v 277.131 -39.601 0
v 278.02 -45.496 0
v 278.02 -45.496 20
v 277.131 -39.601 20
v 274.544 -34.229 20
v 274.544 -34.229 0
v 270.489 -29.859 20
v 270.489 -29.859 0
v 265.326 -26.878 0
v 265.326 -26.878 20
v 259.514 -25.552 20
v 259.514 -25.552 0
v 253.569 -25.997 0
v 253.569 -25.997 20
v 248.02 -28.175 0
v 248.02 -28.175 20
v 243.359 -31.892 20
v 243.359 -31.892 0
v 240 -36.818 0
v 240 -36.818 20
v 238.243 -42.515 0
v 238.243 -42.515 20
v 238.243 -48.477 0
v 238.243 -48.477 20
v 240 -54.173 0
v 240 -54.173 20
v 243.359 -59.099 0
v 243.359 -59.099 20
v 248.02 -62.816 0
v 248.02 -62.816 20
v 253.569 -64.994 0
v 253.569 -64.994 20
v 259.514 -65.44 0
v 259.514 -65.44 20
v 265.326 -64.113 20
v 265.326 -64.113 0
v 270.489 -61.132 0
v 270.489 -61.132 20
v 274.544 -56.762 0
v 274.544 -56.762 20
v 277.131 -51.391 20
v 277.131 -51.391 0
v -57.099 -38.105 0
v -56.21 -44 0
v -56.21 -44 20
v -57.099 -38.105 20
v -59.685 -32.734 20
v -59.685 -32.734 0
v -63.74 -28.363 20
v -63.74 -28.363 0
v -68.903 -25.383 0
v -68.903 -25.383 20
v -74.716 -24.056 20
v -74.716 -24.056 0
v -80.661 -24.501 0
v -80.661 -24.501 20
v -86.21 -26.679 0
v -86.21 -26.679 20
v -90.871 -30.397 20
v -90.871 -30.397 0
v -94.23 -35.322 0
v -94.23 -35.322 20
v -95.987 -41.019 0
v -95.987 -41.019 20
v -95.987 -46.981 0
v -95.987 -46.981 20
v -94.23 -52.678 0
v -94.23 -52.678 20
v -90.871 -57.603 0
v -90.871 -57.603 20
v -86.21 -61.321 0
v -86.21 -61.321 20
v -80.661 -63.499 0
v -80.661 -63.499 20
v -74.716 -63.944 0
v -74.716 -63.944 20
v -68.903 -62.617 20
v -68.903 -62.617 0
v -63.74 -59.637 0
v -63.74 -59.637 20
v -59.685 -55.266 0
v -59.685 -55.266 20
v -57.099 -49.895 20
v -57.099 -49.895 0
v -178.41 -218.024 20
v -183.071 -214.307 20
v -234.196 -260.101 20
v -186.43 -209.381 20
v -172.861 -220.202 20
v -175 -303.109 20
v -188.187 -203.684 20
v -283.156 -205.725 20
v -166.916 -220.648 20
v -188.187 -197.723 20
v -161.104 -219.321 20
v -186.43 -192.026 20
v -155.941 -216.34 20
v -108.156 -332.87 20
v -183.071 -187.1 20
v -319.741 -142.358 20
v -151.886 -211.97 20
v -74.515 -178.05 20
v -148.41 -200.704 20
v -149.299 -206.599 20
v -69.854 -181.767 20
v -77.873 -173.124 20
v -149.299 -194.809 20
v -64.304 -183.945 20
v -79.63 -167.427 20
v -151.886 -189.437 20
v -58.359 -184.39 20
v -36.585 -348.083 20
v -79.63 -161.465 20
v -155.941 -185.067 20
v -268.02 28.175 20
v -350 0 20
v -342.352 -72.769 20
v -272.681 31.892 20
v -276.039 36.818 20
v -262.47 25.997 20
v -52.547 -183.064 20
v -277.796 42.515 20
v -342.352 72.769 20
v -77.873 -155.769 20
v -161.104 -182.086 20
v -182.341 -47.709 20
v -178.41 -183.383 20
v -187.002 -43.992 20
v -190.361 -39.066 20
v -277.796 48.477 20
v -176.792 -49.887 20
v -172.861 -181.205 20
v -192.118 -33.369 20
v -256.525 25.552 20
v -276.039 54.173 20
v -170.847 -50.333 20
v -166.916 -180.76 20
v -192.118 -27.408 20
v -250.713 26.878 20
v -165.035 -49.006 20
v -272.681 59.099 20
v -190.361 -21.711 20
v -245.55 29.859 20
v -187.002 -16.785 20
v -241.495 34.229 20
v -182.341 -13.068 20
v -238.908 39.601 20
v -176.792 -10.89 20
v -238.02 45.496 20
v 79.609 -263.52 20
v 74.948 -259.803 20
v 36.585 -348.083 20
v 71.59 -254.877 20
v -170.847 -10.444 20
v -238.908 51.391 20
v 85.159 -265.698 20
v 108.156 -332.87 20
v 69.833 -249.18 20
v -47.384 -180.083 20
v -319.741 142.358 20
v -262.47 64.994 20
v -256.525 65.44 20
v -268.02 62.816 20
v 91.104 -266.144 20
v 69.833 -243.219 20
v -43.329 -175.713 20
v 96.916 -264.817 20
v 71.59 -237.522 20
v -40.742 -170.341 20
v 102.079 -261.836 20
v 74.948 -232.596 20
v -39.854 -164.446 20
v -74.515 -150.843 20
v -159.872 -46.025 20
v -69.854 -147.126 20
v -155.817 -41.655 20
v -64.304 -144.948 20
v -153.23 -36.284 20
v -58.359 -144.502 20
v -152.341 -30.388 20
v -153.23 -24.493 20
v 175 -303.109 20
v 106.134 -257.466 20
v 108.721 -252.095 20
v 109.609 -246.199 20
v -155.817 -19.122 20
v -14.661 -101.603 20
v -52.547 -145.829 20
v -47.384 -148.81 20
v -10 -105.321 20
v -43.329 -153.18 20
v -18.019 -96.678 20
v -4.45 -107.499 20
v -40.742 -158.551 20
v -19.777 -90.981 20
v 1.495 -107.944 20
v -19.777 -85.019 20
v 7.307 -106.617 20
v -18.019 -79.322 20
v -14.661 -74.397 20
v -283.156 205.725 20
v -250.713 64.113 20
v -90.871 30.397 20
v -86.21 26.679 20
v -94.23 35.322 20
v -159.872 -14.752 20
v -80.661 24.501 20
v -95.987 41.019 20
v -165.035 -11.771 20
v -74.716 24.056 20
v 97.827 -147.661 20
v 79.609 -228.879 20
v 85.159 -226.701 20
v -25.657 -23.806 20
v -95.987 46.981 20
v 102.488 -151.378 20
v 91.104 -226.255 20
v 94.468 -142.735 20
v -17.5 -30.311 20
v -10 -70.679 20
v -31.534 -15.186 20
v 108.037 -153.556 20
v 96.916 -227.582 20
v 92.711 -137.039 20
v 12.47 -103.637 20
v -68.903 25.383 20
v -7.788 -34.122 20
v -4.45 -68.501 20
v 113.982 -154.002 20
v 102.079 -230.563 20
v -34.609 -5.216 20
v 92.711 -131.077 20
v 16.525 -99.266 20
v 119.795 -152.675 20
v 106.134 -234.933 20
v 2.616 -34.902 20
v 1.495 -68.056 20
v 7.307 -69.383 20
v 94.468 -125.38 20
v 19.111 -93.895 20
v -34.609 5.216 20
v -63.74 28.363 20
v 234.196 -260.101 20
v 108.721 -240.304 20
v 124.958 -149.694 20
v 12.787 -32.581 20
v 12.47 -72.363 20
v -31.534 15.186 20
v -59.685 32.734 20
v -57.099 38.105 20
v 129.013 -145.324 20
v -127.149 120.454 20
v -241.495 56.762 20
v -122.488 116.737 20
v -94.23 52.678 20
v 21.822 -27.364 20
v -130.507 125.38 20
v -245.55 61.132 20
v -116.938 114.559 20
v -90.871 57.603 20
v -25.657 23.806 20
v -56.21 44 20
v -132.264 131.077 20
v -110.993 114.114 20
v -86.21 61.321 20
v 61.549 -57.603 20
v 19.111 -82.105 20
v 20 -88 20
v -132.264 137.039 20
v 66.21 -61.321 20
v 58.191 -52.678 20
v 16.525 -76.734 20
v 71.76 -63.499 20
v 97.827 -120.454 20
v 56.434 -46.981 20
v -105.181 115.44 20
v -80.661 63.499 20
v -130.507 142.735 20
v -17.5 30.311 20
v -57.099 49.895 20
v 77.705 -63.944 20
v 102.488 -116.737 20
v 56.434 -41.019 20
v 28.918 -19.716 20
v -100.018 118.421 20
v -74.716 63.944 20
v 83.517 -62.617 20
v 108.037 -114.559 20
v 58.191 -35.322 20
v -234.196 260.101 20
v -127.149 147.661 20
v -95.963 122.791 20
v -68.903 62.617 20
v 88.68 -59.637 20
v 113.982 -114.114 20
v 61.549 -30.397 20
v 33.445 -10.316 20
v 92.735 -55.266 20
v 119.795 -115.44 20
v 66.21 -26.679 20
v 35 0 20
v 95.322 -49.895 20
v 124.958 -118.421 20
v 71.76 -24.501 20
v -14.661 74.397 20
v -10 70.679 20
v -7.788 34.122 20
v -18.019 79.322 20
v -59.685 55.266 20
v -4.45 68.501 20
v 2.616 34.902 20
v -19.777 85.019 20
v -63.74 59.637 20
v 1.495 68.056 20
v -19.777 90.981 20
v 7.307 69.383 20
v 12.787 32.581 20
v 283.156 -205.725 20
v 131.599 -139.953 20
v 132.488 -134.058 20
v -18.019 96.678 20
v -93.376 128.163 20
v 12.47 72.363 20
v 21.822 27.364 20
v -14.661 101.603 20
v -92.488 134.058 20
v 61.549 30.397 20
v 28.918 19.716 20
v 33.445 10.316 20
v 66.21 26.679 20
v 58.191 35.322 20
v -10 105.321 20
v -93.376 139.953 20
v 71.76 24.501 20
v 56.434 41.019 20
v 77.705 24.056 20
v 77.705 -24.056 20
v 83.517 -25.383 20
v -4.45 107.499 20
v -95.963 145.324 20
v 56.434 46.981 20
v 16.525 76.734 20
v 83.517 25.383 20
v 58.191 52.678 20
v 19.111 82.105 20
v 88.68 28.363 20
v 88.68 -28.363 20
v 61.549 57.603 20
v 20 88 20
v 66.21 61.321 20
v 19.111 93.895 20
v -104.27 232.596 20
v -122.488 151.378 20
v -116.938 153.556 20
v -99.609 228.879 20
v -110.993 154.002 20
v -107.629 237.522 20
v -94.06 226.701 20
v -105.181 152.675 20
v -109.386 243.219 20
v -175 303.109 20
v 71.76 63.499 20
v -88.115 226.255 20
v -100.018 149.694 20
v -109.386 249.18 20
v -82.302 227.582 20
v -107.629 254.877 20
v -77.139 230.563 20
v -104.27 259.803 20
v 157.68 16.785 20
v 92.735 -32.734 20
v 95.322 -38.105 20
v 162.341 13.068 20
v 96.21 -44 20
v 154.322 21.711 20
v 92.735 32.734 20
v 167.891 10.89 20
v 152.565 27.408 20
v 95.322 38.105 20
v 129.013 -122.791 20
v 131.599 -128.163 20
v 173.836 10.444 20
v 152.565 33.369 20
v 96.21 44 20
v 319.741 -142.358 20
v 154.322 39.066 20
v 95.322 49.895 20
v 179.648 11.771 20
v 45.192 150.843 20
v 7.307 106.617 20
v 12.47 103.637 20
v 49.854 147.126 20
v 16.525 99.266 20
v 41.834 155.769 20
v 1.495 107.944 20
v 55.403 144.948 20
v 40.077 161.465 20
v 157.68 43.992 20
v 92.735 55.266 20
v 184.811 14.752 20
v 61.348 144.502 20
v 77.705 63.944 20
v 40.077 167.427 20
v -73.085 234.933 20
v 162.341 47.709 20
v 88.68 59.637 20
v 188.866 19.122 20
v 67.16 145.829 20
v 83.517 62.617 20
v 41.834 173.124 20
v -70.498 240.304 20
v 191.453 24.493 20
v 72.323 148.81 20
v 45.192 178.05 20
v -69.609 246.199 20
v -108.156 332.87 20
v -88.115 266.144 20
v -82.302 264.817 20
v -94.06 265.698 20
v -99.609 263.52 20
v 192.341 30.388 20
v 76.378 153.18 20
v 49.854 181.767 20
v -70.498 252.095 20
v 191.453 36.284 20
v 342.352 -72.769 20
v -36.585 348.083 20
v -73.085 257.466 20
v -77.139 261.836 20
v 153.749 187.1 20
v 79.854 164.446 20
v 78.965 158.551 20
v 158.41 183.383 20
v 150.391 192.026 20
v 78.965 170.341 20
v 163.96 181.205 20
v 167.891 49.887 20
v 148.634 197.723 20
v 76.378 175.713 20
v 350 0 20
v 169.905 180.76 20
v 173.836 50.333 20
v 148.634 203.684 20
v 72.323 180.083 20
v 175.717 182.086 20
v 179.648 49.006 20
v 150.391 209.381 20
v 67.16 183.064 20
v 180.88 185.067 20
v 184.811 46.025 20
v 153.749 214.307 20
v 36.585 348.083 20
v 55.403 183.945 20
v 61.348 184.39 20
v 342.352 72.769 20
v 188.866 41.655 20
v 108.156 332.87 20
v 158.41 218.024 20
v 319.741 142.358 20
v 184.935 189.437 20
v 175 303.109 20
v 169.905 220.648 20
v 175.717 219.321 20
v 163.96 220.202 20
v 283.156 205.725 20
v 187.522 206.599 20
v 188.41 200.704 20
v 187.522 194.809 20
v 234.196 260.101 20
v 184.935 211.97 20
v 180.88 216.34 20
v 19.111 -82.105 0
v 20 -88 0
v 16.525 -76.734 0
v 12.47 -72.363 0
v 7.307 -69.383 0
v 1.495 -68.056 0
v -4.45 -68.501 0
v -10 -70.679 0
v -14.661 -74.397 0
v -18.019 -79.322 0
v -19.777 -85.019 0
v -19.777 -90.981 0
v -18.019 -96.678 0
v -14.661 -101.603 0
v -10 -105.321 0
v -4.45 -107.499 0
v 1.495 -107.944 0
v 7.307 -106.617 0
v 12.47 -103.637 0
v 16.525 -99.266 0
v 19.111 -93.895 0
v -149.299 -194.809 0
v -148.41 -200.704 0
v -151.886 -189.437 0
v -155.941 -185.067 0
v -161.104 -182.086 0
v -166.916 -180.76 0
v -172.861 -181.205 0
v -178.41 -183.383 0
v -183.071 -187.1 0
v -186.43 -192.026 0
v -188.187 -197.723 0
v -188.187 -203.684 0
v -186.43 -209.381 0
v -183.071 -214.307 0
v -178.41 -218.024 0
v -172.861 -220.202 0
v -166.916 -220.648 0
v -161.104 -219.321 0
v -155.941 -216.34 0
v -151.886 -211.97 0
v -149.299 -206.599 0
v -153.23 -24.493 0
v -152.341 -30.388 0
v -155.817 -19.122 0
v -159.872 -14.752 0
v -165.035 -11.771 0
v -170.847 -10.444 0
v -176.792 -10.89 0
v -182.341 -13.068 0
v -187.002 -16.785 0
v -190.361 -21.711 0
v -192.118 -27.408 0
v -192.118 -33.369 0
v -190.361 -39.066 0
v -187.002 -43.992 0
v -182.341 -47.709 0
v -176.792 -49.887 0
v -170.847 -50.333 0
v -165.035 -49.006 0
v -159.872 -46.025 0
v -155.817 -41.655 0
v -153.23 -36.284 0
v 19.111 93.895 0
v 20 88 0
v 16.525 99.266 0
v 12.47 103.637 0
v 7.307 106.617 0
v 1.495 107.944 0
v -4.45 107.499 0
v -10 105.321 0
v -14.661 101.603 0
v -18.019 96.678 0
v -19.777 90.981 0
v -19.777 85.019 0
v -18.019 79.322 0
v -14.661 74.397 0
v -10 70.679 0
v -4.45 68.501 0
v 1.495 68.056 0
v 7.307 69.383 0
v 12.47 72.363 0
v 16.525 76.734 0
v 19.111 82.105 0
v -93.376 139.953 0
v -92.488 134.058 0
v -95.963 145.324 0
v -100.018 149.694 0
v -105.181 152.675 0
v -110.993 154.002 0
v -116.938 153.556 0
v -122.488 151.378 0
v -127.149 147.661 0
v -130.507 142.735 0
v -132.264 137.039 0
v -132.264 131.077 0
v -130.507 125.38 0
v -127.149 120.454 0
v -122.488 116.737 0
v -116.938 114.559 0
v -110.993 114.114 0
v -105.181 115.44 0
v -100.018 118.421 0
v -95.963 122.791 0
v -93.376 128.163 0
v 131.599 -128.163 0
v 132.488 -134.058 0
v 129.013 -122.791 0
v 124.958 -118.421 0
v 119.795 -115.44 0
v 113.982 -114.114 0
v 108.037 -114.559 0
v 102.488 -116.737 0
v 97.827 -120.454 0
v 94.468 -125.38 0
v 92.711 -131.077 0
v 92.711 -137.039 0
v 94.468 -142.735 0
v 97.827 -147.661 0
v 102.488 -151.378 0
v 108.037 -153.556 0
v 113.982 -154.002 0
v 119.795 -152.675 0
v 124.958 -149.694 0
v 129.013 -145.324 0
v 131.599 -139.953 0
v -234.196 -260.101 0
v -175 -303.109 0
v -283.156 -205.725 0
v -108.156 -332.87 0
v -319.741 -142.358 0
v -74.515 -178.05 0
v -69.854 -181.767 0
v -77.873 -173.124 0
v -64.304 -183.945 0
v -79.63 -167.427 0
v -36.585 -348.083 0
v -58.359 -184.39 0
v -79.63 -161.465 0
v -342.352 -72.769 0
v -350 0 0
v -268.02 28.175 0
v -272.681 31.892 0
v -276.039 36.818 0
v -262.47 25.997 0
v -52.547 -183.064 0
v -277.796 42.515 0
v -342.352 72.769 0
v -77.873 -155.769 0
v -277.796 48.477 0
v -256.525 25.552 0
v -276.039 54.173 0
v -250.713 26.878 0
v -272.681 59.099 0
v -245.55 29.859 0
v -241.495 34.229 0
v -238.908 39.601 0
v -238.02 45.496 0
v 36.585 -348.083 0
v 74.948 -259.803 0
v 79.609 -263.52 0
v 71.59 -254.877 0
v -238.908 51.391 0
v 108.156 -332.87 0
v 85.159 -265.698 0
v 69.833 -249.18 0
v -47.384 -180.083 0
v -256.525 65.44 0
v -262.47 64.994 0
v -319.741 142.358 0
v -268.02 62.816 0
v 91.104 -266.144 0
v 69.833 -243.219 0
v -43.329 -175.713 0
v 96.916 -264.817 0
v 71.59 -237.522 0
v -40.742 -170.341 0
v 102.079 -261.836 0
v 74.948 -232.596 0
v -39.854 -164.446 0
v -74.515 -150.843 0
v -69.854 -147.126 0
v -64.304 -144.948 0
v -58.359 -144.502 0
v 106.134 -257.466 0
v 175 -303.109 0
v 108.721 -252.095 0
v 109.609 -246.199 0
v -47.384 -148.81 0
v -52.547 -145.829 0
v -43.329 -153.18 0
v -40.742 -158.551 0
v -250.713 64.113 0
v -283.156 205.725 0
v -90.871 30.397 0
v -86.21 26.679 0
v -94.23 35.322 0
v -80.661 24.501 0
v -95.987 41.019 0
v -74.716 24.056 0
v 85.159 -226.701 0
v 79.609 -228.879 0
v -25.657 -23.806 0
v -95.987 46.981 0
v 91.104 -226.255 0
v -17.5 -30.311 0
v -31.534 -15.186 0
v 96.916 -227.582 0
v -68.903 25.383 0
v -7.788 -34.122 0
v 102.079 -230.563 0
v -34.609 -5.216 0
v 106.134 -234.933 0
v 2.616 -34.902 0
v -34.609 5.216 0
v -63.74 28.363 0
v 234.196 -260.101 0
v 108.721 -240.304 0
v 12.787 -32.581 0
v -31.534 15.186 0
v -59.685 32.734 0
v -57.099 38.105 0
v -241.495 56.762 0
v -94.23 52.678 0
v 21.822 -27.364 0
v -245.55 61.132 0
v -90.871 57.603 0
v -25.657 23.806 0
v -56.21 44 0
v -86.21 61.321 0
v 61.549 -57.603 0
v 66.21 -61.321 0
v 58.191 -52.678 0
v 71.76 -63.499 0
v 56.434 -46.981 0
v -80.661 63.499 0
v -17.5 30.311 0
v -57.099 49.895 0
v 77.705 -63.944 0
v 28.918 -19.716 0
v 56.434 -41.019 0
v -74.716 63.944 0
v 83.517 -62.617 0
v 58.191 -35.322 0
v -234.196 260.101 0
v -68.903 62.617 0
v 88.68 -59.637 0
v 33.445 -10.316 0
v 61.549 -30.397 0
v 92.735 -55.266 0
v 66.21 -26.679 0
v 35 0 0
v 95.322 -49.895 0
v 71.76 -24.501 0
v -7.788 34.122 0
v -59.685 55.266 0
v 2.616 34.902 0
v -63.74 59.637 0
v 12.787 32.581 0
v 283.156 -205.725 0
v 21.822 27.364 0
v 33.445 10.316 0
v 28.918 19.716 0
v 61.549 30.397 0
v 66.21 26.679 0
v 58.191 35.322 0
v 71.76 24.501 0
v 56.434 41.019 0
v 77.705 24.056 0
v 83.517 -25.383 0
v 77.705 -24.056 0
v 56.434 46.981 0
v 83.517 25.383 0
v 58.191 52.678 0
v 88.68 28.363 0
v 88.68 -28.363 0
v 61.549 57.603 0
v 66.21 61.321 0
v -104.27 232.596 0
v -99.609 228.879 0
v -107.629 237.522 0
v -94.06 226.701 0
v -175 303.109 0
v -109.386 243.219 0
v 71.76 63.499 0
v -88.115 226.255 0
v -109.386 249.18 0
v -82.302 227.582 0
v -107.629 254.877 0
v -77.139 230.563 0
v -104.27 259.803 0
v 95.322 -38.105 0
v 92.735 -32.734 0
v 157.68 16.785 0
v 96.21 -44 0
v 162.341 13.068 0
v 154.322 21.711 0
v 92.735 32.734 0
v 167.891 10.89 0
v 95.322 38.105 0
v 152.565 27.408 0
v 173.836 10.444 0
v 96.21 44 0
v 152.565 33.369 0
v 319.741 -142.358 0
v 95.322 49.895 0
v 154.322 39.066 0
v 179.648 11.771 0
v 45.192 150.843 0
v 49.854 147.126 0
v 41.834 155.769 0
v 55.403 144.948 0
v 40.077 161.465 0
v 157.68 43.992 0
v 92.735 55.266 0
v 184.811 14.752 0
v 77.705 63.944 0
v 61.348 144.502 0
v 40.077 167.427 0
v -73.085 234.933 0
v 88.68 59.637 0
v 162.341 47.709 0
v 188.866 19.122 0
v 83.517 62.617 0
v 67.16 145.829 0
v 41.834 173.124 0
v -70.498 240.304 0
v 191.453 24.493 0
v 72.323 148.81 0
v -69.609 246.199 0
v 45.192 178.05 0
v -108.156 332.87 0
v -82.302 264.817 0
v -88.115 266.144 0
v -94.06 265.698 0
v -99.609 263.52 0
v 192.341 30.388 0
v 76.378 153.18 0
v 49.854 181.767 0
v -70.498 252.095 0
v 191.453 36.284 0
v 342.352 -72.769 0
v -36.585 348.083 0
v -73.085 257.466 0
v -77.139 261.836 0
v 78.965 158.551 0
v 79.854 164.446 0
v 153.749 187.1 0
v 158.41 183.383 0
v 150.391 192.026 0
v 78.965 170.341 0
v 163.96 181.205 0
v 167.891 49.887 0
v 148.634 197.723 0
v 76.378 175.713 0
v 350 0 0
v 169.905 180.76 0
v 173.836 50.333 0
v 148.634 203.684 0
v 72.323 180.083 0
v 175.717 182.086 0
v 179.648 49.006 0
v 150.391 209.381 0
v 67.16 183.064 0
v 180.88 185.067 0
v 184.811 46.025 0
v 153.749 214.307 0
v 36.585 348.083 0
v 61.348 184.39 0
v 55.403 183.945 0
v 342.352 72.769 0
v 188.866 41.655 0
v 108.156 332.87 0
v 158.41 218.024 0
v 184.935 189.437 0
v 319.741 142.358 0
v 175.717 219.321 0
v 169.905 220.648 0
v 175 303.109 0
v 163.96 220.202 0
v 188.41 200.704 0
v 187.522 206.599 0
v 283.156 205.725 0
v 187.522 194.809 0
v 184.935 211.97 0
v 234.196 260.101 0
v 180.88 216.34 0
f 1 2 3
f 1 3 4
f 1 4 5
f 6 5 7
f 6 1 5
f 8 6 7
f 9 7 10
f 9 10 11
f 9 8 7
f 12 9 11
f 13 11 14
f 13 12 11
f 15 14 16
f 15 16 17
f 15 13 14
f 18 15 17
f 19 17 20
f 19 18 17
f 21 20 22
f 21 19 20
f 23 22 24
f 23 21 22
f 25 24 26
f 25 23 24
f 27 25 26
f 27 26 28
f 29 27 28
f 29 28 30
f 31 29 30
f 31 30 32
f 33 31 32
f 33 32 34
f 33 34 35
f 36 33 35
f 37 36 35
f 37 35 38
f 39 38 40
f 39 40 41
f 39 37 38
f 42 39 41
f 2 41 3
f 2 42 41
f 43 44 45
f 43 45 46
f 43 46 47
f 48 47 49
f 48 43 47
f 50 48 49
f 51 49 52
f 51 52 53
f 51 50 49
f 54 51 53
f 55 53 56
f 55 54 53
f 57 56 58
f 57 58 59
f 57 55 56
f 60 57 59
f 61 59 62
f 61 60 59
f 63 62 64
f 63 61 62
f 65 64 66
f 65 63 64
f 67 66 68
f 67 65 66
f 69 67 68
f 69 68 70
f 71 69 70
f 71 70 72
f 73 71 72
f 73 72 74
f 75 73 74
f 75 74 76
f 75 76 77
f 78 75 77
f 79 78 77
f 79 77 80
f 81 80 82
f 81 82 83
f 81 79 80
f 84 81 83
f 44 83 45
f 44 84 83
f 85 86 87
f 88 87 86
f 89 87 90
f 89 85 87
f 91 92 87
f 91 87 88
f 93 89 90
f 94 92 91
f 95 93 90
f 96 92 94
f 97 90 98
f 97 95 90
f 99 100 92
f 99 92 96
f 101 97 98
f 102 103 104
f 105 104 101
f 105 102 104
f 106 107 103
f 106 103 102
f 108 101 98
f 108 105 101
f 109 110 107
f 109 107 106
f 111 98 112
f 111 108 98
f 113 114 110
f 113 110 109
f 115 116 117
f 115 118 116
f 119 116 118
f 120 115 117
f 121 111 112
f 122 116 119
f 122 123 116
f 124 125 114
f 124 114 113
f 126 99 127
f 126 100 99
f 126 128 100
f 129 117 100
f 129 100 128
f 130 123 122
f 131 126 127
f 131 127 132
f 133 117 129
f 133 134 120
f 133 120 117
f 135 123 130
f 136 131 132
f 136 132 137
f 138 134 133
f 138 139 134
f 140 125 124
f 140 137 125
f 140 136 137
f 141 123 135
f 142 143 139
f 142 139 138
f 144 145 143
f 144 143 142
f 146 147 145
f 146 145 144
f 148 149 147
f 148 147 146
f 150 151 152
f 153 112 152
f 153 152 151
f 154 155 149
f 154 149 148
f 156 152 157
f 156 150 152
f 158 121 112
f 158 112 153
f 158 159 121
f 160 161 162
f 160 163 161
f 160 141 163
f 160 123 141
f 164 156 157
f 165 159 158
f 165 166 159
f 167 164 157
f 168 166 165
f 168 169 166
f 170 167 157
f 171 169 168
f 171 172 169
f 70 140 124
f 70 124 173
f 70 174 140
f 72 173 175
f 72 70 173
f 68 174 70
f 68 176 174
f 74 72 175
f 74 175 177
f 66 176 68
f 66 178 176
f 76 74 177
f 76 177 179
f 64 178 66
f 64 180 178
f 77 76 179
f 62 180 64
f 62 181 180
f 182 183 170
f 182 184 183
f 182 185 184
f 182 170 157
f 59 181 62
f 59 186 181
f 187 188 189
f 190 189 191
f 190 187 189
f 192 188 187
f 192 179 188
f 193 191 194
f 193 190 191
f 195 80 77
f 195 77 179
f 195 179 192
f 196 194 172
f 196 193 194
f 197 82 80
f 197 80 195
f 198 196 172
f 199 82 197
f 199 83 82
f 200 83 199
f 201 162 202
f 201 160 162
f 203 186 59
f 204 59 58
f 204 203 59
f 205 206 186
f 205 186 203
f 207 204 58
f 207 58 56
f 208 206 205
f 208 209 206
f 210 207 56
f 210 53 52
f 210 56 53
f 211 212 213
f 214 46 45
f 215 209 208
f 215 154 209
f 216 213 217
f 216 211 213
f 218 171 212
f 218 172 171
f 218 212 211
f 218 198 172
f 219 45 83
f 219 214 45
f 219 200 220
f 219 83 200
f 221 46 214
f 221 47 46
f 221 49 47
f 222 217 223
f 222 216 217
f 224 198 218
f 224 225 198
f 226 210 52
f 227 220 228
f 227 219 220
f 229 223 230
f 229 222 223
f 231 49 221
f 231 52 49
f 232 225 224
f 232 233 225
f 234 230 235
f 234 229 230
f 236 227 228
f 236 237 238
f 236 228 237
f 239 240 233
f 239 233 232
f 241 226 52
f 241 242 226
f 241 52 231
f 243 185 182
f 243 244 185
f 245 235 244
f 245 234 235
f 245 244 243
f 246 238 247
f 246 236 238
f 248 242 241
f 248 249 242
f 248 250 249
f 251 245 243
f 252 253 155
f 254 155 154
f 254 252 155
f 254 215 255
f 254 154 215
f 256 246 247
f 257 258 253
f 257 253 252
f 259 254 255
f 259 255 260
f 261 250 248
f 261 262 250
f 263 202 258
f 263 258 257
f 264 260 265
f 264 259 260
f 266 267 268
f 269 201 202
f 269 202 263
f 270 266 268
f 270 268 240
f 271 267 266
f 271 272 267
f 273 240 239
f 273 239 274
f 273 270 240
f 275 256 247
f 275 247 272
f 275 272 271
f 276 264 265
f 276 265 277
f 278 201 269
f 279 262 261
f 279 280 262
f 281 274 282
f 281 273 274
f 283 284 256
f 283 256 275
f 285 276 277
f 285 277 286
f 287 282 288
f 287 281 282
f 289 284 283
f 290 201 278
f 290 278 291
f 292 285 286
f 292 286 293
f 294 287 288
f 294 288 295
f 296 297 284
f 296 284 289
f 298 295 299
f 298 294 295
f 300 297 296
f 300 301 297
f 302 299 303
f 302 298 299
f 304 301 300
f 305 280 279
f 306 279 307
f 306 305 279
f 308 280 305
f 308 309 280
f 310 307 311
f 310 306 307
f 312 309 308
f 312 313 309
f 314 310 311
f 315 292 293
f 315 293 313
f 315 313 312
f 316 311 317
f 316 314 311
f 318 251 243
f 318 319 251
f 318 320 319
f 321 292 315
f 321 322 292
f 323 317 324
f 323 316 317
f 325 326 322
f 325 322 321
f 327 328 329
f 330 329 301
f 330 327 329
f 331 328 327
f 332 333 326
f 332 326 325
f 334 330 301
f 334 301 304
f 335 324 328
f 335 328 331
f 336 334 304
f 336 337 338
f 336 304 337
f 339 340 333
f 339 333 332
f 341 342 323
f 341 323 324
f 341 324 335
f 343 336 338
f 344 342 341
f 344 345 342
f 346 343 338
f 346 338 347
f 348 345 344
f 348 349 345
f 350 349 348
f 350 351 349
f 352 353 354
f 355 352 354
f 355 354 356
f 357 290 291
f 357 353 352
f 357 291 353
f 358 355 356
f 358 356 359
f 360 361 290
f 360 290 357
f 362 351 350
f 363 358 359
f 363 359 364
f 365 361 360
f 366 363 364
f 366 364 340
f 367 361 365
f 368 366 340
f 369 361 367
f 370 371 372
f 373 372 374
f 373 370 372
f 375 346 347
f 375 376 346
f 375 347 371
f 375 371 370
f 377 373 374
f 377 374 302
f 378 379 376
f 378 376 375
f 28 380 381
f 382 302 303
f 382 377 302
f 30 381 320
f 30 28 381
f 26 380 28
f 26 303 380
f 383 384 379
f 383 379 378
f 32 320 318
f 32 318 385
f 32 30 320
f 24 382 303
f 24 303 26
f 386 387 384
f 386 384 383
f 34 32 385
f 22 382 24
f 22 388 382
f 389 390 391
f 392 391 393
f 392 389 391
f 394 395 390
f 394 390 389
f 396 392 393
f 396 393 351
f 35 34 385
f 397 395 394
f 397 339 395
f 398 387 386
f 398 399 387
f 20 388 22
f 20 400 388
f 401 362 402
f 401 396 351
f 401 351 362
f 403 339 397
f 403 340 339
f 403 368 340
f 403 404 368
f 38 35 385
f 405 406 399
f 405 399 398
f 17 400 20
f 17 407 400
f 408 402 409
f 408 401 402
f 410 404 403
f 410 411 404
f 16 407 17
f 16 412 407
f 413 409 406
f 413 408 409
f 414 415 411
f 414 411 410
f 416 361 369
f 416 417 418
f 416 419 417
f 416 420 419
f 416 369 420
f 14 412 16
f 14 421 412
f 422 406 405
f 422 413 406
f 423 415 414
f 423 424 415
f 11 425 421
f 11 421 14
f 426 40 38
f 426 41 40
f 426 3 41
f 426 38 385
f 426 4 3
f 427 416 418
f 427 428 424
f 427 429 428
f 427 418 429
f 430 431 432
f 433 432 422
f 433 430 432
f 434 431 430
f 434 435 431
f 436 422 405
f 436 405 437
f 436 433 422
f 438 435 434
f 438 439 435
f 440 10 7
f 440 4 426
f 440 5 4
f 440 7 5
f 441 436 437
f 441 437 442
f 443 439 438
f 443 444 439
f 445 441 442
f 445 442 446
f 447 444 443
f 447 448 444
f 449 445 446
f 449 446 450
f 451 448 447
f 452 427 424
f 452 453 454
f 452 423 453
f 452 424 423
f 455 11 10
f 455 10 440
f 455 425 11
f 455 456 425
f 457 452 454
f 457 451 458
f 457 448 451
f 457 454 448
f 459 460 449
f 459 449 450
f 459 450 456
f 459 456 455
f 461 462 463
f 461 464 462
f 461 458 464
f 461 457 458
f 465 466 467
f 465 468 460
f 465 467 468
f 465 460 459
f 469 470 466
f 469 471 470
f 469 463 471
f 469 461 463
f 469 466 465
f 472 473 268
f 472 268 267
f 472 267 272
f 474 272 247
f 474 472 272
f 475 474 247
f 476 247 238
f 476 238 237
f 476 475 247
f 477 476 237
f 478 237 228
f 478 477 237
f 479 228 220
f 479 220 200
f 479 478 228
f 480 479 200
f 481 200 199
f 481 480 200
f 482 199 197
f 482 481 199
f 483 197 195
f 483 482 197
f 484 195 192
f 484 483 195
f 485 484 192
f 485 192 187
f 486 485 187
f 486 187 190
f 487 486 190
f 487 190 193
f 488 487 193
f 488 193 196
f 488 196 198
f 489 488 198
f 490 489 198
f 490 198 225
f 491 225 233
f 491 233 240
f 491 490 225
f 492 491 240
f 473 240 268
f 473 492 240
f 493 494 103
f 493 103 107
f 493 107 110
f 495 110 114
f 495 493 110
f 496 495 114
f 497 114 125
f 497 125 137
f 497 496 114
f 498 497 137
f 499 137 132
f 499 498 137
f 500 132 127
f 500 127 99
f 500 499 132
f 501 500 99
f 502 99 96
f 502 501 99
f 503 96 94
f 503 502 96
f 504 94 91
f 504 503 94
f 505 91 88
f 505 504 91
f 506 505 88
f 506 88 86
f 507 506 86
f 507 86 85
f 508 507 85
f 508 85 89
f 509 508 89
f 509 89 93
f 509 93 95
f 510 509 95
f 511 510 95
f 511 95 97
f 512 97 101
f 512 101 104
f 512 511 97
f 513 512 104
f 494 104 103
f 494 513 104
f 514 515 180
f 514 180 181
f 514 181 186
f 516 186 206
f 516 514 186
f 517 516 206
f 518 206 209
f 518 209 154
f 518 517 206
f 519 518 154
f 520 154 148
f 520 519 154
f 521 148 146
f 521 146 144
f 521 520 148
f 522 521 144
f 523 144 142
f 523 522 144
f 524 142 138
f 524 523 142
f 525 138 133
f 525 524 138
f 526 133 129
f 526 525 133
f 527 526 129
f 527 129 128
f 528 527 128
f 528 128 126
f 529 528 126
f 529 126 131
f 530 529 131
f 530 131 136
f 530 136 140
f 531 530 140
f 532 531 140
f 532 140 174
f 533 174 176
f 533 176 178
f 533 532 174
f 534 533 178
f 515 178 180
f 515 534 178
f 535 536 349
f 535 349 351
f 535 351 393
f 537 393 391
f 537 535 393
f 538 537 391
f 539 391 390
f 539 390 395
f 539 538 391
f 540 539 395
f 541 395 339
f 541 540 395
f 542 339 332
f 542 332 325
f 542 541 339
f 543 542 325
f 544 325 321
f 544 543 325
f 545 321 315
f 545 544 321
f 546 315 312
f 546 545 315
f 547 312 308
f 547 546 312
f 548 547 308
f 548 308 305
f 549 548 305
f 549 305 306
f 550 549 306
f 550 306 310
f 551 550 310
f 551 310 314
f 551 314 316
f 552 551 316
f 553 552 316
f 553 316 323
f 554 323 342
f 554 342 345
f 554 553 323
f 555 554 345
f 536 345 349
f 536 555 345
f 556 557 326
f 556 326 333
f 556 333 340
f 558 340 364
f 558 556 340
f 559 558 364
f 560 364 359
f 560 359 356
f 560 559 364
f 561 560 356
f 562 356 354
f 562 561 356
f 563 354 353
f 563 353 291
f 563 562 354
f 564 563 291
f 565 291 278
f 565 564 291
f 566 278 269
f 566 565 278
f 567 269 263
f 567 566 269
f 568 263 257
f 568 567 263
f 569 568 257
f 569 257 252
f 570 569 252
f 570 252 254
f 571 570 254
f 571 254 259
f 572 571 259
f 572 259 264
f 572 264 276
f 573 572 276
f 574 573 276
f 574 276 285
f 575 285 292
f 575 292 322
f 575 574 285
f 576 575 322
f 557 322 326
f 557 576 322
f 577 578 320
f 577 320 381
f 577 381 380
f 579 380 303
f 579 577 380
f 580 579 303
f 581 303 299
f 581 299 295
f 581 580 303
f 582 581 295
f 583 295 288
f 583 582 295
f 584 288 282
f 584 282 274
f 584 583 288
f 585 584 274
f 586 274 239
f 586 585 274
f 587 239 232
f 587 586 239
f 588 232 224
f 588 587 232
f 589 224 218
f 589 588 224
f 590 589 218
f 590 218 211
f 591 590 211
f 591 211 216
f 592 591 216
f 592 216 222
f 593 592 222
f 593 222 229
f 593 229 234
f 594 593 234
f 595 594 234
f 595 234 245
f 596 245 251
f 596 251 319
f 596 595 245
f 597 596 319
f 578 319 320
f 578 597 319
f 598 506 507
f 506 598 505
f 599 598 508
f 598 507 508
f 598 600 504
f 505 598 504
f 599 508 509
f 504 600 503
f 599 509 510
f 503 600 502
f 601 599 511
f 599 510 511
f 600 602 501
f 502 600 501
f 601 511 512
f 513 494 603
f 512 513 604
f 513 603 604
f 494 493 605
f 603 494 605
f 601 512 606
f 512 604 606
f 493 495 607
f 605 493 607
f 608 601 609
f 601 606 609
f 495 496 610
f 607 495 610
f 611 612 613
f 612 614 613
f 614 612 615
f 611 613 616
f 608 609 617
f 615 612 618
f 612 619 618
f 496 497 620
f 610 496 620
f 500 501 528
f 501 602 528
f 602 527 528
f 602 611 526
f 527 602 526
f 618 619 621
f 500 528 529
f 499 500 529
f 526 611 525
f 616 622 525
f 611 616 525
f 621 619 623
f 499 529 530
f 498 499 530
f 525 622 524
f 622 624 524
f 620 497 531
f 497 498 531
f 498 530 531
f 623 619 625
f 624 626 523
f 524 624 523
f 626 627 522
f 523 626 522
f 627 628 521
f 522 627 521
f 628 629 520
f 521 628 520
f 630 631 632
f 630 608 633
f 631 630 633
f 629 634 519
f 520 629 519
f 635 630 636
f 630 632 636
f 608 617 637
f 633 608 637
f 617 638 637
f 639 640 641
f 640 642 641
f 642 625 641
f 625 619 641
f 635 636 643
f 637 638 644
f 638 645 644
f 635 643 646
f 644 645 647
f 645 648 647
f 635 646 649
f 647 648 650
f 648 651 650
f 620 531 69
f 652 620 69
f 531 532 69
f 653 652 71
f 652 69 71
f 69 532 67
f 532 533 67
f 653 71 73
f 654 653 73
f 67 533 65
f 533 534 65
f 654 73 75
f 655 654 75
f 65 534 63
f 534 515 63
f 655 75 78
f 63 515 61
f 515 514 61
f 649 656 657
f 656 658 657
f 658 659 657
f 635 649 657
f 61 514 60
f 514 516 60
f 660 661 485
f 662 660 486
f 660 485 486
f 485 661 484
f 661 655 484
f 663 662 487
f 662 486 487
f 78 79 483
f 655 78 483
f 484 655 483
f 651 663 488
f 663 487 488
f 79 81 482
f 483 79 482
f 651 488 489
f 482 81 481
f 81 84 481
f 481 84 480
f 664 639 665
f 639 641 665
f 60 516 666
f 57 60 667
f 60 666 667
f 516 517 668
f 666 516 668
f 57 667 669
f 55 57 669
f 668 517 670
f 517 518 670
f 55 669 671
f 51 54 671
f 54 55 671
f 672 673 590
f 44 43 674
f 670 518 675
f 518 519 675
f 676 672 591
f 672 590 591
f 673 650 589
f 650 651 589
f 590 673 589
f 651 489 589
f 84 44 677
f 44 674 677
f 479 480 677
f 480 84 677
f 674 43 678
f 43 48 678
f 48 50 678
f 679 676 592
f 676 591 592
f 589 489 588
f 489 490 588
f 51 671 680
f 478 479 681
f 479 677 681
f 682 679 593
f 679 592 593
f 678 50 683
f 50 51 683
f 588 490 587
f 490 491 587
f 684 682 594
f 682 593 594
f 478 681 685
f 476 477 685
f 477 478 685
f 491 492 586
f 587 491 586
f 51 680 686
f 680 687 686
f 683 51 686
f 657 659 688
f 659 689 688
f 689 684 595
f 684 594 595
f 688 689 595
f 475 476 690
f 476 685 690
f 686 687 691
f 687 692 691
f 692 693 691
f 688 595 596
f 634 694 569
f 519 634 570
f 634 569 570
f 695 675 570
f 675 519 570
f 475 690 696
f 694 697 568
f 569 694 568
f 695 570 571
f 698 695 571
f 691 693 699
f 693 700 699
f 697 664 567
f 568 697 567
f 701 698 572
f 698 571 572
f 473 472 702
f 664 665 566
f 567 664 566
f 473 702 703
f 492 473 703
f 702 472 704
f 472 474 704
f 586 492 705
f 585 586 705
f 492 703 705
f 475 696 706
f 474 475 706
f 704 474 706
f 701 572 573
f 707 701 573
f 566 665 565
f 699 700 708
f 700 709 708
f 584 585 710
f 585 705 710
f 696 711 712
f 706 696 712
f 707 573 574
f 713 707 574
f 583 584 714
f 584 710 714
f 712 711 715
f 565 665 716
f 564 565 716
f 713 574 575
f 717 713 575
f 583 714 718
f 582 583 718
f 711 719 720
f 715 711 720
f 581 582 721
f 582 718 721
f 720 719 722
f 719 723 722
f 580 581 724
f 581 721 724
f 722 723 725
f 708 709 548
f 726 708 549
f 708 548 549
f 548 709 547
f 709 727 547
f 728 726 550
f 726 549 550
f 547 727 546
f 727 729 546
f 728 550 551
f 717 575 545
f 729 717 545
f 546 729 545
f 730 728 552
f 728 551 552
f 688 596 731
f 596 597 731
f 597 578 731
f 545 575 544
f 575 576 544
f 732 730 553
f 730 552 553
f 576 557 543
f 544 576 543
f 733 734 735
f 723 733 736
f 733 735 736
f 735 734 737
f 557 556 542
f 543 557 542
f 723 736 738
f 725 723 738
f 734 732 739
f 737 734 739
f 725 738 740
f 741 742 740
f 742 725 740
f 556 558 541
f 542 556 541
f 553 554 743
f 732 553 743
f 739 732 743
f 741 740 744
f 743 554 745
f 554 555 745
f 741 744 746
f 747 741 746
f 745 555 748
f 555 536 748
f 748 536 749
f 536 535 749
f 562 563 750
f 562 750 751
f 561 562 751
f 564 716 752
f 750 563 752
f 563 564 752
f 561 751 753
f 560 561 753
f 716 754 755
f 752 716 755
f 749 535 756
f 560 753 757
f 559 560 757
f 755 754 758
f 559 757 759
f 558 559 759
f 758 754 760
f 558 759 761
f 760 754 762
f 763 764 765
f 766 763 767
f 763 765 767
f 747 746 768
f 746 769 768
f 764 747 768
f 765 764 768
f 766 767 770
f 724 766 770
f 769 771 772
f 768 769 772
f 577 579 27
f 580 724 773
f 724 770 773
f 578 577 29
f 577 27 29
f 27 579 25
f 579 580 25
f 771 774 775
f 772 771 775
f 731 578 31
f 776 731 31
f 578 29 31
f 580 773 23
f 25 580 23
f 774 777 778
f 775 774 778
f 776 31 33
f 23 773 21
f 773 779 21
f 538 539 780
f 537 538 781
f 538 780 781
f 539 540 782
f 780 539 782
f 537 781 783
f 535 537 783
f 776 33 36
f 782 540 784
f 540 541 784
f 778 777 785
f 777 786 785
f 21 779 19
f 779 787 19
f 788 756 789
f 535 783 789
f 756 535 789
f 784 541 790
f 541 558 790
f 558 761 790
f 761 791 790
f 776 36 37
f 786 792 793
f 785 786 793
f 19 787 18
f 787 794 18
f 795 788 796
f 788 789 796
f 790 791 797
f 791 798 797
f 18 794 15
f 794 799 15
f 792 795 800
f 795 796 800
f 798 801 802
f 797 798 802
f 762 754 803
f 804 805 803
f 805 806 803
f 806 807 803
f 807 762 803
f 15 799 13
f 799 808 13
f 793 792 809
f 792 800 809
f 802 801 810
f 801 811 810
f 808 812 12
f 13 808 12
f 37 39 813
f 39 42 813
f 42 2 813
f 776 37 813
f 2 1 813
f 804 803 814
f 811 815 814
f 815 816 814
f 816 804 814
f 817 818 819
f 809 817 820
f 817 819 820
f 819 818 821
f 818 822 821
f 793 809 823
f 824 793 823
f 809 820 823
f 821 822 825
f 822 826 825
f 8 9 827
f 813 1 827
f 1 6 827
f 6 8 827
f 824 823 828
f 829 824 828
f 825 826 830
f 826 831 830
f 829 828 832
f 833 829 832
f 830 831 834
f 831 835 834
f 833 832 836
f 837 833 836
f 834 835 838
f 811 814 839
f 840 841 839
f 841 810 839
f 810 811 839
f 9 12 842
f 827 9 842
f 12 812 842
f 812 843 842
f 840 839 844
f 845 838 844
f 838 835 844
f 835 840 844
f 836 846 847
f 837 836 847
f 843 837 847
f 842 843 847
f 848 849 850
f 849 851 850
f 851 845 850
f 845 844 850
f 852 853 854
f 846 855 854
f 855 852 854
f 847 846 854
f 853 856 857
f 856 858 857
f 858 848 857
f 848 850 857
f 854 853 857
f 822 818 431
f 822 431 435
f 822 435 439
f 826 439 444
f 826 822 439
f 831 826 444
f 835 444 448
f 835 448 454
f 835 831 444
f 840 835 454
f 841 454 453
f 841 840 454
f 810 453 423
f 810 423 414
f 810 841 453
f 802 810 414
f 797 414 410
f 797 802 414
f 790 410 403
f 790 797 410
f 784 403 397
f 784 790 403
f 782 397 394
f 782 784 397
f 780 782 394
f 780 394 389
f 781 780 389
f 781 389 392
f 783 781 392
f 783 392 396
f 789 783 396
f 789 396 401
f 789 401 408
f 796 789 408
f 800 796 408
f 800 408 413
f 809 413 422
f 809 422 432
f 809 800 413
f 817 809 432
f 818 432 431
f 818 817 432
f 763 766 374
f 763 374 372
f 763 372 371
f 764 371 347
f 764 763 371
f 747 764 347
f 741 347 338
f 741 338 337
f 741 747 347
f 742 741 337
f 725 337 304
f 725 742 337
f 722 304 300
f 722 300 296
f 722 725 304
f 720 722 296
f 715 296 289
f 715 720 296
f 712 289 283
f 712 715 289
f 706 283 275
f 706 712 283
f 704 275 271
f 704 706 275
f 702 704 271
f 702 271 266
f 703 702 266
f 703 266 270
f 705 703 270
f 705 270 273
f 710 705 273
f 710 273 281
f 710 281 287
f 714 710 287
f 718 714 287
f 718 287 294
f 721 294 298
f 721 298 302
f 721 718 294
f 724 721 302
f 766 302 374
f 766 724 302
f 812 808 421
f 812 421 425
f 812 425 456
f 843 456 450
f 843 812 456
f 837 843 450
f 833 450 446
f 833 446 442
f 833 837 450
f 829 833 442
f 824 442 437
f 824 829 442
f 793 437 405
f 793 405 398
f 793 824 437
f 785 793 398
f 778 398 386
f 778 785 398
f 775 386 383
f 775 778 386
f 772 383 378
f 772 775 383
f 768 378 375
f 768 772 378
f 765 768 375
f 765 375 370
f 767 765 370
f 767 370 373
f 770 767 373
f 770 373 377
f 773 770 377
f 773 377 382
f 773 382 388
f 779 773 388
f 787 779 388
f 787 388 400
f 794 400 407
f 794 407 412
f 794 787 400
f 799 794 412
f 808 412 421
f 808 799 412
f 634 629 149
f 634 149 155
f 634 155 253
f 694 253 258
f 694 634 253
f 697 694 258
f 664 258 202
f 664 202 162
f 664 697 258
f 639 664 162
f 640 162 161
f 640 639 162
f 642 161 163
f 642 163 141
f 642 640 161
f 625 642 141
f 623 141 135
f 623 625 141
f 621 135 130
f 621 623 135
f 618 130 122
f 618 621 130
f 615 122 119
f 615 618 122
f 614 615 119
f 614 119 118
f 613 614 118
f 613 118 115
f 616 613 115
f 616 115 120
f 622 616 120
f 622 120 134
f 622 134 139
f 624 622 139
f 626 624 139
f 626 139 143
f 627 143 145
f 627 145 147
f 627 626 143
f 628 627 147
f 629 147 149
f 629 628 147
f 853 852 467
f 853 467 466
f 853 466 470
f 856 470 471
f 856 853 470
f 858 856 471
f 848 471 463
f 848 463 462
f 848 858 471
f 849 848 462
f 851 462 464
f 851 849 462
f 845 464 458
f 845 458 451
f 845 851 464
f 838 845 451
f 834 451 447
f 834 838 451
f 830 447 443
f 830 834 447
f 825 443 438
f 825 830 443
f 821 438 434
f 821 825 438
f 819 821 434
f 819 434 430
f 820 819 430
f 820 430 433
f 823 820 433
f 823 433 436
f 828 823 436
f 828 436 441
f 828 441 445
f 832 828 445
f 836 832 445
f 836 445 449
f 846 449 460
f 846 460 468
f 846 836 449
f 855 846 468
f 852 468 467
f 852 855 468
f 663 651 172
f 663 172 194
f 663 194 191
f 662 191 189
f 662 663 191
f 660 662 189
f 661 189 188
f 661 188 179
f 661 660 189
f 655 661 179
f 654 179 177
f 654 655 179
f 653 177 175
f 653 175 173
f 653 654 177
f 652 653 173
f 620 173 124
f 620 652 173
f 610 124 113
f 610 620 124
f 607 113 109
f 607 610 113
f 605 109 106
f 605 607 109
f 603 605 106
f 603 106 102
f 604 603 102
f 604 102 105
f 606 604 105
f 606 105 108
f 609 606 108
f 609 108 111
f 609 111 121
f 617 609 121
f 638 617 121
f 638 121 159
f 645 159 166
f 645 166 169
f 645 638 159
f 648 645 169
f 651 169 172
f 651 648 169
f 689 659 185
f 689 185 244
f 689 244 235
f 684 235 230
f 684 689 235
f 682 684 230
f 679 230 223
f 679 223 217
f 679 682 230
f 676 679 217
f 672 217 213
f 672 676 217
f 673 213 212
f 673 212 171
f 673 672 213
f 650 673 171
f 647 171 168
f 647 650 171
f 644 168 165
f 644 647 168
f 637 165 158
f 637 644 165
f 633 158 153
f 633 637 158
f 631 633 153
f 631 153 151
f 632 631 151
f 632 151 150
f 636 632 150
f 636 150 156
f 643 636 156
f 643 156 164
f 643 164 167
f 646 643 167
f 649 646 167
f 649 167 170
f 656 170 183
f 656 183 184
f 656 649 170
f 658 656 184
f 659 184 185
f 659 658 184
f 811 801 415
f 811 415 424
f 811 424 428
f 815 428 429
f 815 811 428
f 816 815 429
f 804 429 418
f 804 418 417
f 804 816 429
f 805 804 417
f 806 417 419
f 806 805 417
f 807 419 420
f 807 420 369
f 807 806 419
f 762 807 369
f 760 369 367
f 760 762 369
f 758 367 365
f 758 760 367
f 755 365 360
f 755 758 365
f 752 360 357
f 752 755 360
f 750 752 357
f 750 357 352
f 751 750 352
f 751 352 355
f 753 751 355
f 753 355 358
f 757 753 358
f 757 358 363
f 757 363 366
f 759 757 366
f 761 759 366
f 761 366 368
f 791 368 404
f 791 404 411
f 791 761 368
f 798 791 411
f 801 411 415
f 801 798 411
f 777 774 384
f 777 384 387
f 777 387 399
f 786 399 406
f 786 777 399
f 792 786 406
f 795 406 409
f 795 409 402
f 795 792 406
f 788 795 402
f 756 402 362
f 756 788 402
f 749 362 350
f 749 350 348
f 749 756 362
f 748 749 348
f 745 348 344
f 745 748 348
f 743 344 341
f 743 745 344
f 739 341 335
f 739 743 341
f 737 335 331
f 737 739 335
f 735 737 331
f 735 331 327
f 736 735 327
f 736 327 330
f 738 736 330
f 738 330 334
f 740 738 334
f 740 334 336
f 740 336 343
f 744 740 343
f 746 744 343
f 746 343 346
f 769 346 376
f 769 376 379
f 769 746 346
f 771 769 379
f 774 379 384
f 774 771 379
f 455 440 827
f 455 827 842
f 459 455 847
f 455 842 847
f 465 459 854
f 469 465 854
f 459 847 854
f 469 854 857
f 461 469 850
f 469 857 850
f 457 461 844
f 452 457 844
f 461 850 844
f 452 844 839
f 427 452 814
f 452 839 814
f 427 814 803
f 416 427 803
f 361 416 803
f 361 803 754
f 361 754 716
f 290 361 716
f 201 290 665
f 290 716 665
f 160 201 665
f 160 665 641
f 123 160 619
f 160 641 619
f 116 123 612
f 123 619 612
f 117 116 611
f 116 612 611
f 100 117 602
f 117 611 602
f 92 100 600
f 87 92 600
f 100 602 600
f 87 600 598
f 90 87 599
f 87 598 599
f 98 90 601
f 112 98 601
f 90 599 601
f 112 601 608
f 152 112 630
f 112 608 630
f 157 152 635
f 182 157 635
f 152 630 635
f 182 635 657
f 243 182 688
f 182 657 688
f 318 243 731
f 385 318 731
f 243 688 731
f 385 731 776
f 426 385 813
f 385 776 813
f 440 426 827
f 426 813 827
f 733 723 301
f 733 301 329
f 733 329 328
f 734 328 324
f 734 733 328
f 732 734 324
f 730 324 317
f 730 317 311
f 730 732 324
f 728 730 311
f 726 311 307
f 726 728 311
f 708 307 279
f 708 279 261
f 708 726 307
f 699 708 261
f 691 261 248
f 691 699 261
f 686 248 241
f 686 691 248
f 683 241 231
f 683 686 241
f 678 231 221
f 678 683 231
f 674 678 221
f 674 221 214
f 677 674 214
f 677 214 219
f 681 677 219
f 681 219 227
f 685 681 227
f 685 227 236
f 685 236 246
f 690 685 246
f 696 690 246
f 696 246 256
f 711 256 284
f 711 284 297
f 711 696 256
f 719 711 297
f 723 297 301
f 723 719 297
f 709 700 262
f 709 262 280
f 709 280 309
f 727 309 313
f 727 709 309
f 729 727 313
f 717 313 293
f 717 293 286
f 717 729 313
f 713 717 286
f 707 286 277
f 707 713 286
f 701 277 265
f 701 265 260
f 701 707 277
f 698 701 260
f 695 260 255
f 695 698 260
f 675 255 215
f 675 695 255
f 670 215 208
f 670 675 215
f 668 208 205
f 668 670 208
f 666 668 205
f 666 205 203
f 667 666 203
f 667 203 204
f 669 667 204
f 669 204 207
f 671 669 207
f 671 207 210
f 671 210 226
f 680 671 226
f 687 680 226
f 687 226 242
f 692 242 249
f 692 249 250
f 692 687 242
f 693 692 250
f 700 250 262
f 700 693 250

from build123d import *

# Parameters (mm, degrees)
F0_R     = 350
F0_R_2   = 20
F0_R_3   = 35
F1_DEPTH = 20


with BuildPart() as f1:
    # F0 (on Top) → F1 (new body)
    with BuildSketch(Plane.XY):
        Circle(F0_R)
        with Locations((-168.410354, -200.703644)):
            Circle(F0_R_2, mode=Mode.SUBTRACT)
        with Locations((-59.853525, -164.446209)):
            Circle(F0_R_2, mode=Mode.SUBTRACT)
        with Locations((-172.341357, -30.388431)):
            Circle(F0_R_2, mode=Mode.SUBTRACT)
        with Locations((-76.210236, -44)):
            Circle(F0_R_2, mode=Mode.SUBTRACT)
        with Locations((89.609278, -246.199467)):
            Circle(F0_R_2, mode=Mode.SUBTRACT)
        with Locations((0, -88)):
            Circle(F0_R_2, mode=Mode.SUBTRACT)
        with Locations((112.487832, -134.057778)):
            Circle(F0_R_2, mode=Mode.SUBTRACT)
        with Locations((76.210236, -44)):
            Circle(F0_R_2, mode=Mode.SUBTRACT)
        with Locations((258.019631, -45.495823)):
            Circle(F0_R_2, mode=Mode.SUBTRACT)
        with Locations((-258.019631, 45.495823)):
            Circle(F0_R_2, mode=Mode.SUBTRACT)
        with Locations((-76.210236, 44)):
            Circle(F0_R_2, mode=Mode.SUBTRACT)
        with Locations((-112.487832, 134.057778)):
            Circle(F0_R_2, mode=Mode.SUBTRACT)
        with Locations((-89.609278, 246.199467)):
            Circle(F0_R_2, mode=Mode.SUBTRACT)
        Circle(F0_R_3, mode=Mode.SUBTRACT)
        with Locations((76.210236, 44)):
            Circle(F0_R_2, mode=Mode.SUBTRACT)
        with Locations((172.341357, 30.388431)):
            Circle(F0_R_2, mode=Mode.SUBTRACT)
        with Locations((0, 88)):
            Circle(F0_R_2, mode=Mode.SUBTRACT)
        with Locations((59.853525, 164.446209)):
            Circle(F0_R_2, mode=Mode.SUBTRACT)
        with Locations((168.410354, 200.703644)):
            Circle(F0_R_2, mode=Mode.SUBTRACT)
    extrude(amount=F1_DEPTH)


solid = f1.part
